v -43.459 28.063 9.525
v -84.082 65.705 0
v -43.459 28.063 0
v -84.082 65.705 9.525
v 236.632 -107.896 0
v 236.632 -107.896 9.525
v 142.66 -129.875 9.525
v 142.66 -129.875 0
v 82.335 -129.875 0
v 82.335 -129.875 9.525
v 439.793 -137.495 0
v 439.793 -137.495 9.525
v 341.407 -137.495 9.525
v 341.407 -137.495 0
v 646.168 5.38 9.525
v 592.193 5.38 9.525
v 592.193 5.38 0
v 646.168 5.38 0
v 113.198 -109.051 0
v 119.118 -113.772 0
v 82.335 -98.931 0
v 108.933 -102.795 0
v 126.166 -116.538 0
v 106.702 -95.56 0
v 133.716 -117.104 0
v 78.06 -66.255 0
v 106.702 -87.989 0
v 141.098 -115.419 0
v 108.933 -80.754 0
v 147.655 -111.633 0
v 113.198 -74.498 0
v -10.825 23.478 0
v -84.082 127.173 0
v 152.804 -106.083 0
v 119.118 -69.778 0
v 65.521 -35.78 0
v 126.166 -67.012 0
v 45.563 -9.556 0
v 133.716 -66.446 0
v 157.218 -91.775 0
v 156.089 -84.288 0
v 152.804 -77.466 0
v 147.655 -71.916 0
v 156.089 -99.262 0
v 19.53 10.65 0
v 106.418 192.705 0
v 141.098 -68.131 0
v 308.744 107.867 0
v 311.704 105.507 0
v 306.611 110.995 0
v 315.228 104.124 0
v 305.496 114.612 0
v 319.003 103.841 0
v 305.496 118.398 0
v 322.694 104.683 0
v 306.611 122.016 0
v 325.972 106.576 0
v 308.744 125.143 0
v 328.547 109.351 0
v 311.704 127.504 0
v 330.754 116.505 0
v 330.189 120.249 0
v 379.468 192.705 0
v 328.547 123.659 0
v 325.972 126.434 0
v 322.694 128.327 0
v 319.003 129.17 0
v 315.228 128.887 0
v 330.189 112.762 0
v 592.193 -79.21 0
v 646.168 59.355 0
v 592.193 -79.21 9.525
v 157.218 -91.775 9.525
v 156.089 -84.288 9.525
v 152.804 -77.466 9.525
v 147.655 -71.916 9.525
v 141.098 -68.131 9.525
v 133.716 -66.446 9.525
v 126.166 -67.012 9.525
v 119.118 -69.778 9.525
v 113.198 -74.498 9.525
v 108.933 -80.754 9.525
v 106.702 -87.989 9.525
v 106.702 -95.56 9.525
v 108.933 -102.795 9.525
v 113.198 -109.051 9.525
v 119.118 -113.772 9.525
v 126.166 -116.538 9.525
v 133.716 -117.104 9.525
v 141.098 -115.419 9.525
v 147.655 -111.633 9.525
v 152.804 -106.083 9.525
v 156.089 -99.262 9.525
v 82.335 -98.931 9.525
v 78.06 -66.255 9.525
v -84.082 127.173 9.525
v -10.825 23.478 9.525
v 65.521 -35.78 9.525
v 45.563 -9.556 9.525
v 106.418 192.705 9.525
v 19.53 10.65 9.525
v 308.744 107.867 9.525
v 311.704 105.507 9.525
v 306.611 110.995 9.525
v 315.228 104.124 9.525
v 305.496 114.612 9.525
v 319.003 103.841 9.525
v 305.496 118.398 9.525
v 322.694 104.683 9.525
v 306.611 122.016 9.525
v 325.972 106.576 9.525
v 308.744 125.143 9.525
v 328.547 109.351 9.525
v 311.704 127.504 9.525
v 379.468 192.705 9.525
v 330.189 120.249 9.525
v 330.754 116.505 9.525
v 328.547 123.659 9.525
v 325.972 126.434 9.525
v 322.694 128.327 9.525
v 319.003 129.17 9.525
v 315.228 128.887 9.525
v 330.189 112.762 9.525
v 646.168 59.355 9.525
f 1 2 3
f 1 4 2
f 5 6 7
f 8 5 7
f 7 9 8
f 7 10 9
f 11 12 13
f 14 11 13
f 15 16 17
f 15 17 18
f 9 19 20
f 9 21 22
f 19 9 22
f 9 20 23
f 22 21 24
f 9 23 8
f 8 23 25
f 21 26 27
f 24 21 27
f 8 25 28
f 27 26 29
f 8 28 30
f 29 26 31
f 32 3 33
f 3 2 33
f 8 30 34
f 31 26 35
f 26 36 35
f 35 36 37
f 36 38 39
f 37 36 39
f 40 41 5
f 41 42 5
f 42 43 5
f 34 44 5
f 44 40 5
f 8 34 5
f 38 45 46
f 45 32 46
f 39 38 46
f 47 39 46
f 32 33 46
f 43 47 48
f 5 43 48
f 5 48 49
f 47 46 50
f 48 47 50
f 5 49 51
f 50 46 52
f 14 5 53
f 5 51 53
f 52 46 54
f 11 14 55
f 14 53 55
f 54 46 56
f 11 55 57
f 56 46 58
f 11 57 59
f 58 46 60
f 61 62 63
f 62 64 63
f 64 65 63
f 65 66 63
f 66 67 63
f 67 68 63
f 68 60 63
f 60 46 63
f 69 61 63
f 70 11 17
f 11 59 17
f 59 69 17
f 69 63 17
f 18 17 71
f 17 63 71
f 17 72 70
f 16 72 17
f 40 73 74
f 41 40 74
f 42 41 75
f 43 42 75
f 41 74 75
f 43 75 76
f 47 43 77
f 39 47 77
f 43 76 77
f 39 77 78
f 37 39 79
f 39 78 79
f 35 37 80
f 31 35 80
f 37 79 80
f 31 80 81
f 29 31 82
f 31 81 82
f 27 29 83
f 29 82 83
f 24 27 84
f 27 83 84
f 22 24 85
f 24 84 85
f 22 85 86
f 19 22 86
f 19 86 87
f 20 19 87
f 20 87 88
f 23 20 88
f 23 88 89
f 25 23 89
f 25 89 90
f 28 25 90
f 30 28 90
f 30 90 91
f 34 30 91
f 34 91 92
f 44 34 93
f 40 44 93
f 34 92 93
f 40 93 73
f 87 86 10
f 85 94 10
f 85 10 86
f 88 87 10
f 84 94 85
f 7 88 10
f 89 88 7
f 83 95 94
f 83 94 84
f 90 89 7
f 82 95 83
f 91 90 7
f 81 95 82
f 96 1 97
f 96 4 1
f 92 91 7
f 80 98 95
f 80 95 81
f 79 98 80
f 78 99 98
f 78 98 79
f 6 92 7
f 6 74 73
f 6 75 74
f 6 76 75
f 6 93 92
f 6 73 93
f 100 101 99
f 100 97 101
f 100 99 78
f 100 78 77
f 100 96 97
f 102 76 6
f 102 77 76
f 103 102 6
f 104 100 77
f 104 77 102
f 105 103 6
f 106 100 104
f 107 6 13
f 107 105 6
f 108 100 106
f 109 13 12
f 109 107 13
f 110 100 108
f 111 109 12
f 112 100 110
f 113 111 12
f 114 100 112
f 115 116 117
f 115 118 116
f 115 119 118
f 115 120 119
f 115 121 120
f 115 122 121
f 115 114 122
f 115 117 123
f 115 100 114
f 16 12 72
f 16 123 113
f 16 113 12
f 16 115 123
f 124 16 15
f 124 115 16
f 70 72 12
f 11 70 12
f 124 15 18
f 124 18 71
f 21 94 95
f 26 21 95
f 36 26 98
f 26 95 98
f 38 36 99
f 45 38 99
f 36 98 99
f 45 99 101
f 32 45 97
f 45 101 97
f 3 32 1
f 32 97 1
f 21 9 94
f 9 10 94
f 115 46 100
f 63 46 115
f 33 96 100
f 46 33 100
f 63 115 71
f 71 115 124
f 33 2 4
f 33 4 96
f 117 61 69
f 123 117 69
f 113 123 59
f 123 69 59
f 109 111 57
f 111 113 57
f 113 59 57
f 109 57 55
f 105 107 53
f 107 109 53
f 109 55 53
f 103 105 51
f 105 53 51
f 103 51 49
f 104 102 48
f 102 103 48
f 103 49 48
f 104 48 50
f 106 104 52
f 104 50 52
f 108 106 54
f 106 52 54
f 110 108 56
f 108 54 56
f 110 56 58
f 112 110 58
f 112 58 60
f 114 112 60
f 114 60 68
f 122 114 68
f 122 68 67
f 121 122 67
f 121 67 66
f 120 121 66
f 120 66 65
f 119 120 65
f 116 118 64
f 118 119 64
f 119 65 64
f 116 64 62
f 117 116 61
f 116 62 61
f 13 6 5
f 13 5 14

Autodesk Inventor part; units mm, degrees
ref_plane "YZ Plane" through (0, 0, 0) normal (1, 0, 0) x (0, 1, 0)
ref_plane "XZ Plane" through (0, 0, 0) normal (0, 1, 0) x (-1, 0, 0)
ref_plane "XY Plane" through (0, 0, 0) normal (0, 0, 1) x (1, 0, 0)
sketch "Sketch1" plane through (0, 0, 0) normal (0, 0, 1) x (1, 0, 0)
  line L0 (-84.0821, 192.7052) -> (642.9929, 192.7052)
  line L1 (642.9929, 192.7052) -> (642.9929, -137.4948)
  line L2 (642.9929, -137.4948) -> (-84.0821, -137.4948)
  line L3 (-84.0821, -137.4948) -> (-84.0821, 192.7052)
  circle A0 centre (131.8179, -91.7748) radius 25.4
  circle A1 centre (318.0537, 116.5052) radius 12.7
  line L4 (642.9929, -137.4948) -> (592.1929, -137.4948)
  line L5 (592.1929, -137.4948) -> (592.1929, -73.9948)
  line L6 (592.1929, -73.9948) -> (642.9929, -73.9948)
  line L7 (642.9929, -73.9948) -> (642.9929, -137.4948)
  line L8 (642.9929, 192.7052) -> (592.6352, 192.7052)
  line L9 (642.9929, 2.2052) -> (642.9929, 192.7052)
  line L10 (-84.0821, 53.0052) -> (5.7204, 53.0052) construction
  line L11 (-84.0821, 65.7052) -> (68.3179, -137.4948)
  line L12 (595.3679, 192.7052) -> (595.3679, 2.2052)
  line L13 (595.3679, 2.2052) -> (642.9929, 2.2052)
  point P0 (0, 0)
  dimension "d0" = 727.075
  dimension "d2" = 50.8
  dimension "d3" = 25.4
  dimension "d4" = 215.9
  dimension "d5" = 279.4
  dimension "d14" = 152.4
  dimension "d15" = 203.2
  dimension "d16" = 330.2
  dimension "d17" = 63.5
  dimension "d19" = 50.8
  dimension "d20" = 139.7
  dimension "d21" = 45.72
  dimension "d22" = 254
extrude "Extrusion1" add sketch "Sketch1" along normal blind 9.525 contours L0 L12 L13 L1 L6 L5 L2 L11 L3
sketch "Sketch3" plane through (0, 0, 9.525) normal (0, 0, 1) x (1, 0, 0)
  line L0 (595.3679, 2.2052) -> (595.3679, 192.7052) projected
  line L1 (595.3679, 192.7052) -> (-84.0821, 192.7052) projected
  line L2 (-84.0821, 192.7052) -> (-84.0821, 65.7052) projected
  line L3 (-84.0821, 127.1732) -> (106.4179, 192.7052)
  line L4 (595.3679, 2.2052) -> (684.2679, 2.2052)
  line L5 (684.2679, 2.2052) -> (684.2679, 40.3052)
  line L6 (684.2679, 40.3052) -> (595.3679, 40.3052)
  line L7 (595.3679, 40.3052) -> (595.3679, 2.2052)
  line L8 (684.2679, 40.3052) -> (379.4679, 192.7052)
  line L9 (595.3679, 40.3052) -> (595.3679, 84.7552)
  line L10 (595.3679, 84.7552) -> (595.3679, 192.7052)
  point P0 (0, 0)
  dimension "d32" = 190.5
  dimension "d33" = 65.532
  dimension "d38" = 88.9
  dimension "d39" = 38.1
  dimension "d40" = 215.9
extrude "Extrusion4" cut sketch "Sketch3" against normal blind 9.525 contours L3 L2 L1 | L8 L1 L0 | L0 L8 L6
sketch "Sketch4" plane through (0, 0, 9.525) normal (0, 0, 1) x (1, 0, 0)
  line L0 (595.3679, 2.2052) -> (595.3679, 84.7552) projected
  line L1 (595.3679, 84.7552) -> (379.4679, 192.7052) projected
  line L2 (595.3679, 84.7552) -> (684.2679, 40.3052)
  line L3 (684.2679, 40.3052) -> (595.3679, 40.3052)
  point P0 (0, 0)
  dimension "d43" = 88.9
extrude "Extrusion5" add sketch "Sketch4" against normal blind 9.525
sketch "Sketch5" plane through (0, 0, 9.525) normal (0, 0, 1) x (1, 0, 0)
  line L0 (642.9929, 2.2052) -> (592.1929, 2.2052)
  line L1 (592.1929, 2.2052) -> (592.1929, -73.9948)
  line L2 (592.1929, -73.9948) -> (642.9929, -73.9948)
  line L3 (642.9929, -73.9948) -> (642.9929, 2.2052)
  point P0 (0, 0)
extrude "Extrusion6" cut sketch "Sketch5" against normal blind 9.525
sketch "Sketch6" plane through (0, 0, 9.525) normal (0, 0, 1) x (1, 0, 0)
  line L0 (592.1929, -137.4948) -> (592.1929, 2.2052) projected
  line L1 (646.1679, 91.1052) -> (723.1394, 91.1052)
  line L2 (723.1394, 91.1052) -> (723.1394, -6.7385)
  line L3 (723.1394, -6.7385) -> (646.1679, -6.7385)
  line L4 (646.1679, -6.7385) -> (646.1679, 91.1052)
  line L5 (595.3679, 2.2052) -> (592.1929, 2.2052)
  line L6 (592.1929, 2.2052) -> (592.1929, 40.3052)
  line L7 (592.1929, 40.3052) -> (595.3679, 40.3052)
  line L8 (595.3679, 40.3052) -> (595.3679, 2.2052)
  point P0 (0, 0)
  dimension "d48" = 53.975
extrude "Extrusion7" cut sketch "Sketch6" against normal blind 9.525
sketch "Sketch8" plane through (0, 0, 9.525) normal (0, 0, 1) x (1, 0, 0)
  line L0 (-84.0821, 65.7052) -> (68.3179, -137.4948) projected
  line L1 (68.3179, -137.4948) -> (592.1929, -137.4948) projected
  line L2 (592.1929, -137.4948) -> (592.1929, 40.3052) projected
  line L3 (592.1929, -96.6594) -> (439.7929, -137.4948)
  line L4 (341.7489, -137.4948) -> (170.3104, -117.1748)
  line L5 (170.3104, -117.1748) -> (53.0779, -117.1748)
  point P0 (0, 0)
  dimension "d51" = 152.4
  dimension "d52" = 165
  dimension "d53" = 98.044
  dimension "d54" = 20.32
  dimension "d60" = 173.24
extrude "Extrusion8" cut sketch "Sketch8" against normal blind 9.525
sketch "Sketch9" plane through (0, 0, 9.525) normal (0, 0, 1) x (1, 0, 0)
  line L0 (592.1929, -96.6594) -> (592.1929, 40.3052) projected
  line L1 (646.1679, 40.3052) -> (592.1929, 40.3052)
  line L2 (592.1929, 40.3052) -> (592.1929, 5.3802)
  line L3 (592.1929, 5.3802) -> (646.1679, 5.3802)
  line L4 (646.1679, 5.3802) -> (646.1679, 40.3052)
  point P0 (0, 0)
  dimension "d57" = 34.925
extrude "Extrusion9" add sketch "Sketch9" against normal blind 9.525
sketch "Sketch10" plane through (0, 0, 9.525) normal (0, 0, 1) x (1, 0, 0)
  line L0 (-84.0821, 65.7052) -> (53.0779, -117.1748) projected
  line L1 (-84.0821, 127.1732) -> (-84.0821, 65.7052) projected
  line L2 (53.0779, -117.1748) -> (170.3104, -117.1748) projected
  arc A0 (82.3351, -98.9312) -> (-55.5071, 27.6052) centre (-44.6649, -98.9312) ccw
  line L3 (341.7489, -137.4948) -> (439.7929, -137.4948) projected
  line L4 (82.3351, -117.1748) -> (82.3351, -75.9981)
  point P0 (0, 0)
  point P1 (81.0179, -117.1748)
  point P2 (131.8179, -117.1748)
  dimension "d62" = 38.1
  dimension "d65" = 127
  dimension "d66" = 165.1
extrude "Extrusion10" cut sketch "Sketch10" against normal blind 25.4
sketch "Sketch12" plane through (0, 0, 9.525) normal (0, 0, 1) x (1, 0, 0)
  circle A0 centre (131.8179, -91.7748) radius 25.4 projected
  circle A1 centre (131.8179, -91.7748) radius 38.1
  point P0 (0, 0)
  dimension "d70" = 76.2
extrude "Extrusion12" cut sketch "Sketch12" against normal blind 9.525
sketch "Sketch14" plane through (0, 0, 9.525) normal (0, 0, 1) x (1, 0, 0)
  arc A0 (160.2159, -117.1748) -> (103.4198, -117.1748) centre (131.8179, -91.7748) ccw projected
  line L0 (160.2159, -117.1748) -> (170.3104, -117.1748) projected
  line L1 (170.3104, -117.1748) -> (341.7489, -137.4948) projected
  line L2 (82.3351, -117.1748) -> (103.4198, -117.1748) projected
  circle A1 centre (131.8179, -91.7748) radius 38.1
  line L3 (341.7489, -137.4948) -> (82.3351, -137.4948)
  line L4 (82.3351, -137.4948) -> (82.3351, -117.1748)
  point P0 (0, 0)
  dimension "d74" = 20.32
extrude "Extrusion13" add sketch "Sketch14" against normal blind 9.525 contours L0 L1 L3 L4 L2 A1
sketch "Sketch15" plane through (0, 0, 9.525) normal (0, 0, 1) x (1, 0, 0)
  circle A0 centre (131.8179, -91.7748) radius 38.1 projected
  line L0 (82.3351, -98.9312) -> (82.3351, -137.4948) projected
  line L1 (82.3351, -137.4948) -> (439.7929, -137.4948) projected
  circle A1 centre (185.7929, -51.1348) radius 76.2
  circle A2 centre (373.8763, -101.9348) radius 76.2
  line L2 (82.3351, -110.8248) -> (177.5851, -110.8248)
  line L3 (177.5851, -110.8248) -> (177.5851, -72.7248)
  line L4 (177.5851, -72.7248) -> (82.3351, -72.7248)
  line L5 (82.3351, -72.7248) -> (82.3351, -110.8248)
  line L6 (236.6324, -107.8955) -> (341.4074, -137.4948)
  line L7 (-84.0821, 127.1732) -> (-84.0821, 65.7052) projected
  line L8 (131.8179, -129.8748) -> (175.334, -129.8748)
  line L9 (131.8179, -129.8748) -> (82.3351, -129.8748)
  line L10 (236.6324, -107.8955) -> (142.6601, -129.8748)
  point P0 (0, 0)
  point P1 (154.0824, -137.4948)
  dimension "d77" = 152.4
  dimension "d78" = 53.975
  dimension "d79" = 40.64
  dimension "d80" = 152.4
  dimension "d81" = 291.5412
  dimension "d82" = 35.56
  dimension "d84" = 95.25
  dimension "d85" = 38.1
  dimension "d86" = 26.67
  dimension "d87" = 82.55
  dimension "d90" = 104.775
  dimension "d101" = 60.325
sketch "Sketch17" plane through (0, 0, 9.525) normal (0, 0, 1) x (1, 0, 0)
  line L0 (439.7929, -137.4948) -> (592.1929, -96.6594) projected
  line L1 (592.1929, -96.6594) -> (592.1929, 5.3802) projected
  line L2 (592.1929, -79.2096) -> (439.7929, -137.4948)
  point P0 (0, 0)
  dimension "d94" = 17.4498
extrude "Extrusion16" cut sketch "Sketch17" against normal blind 9.525
extrude "Extrusion18" cut sketch "Sketch15" against normal blind 9.525 contours L8 L10 A1 L6 A2 L1 L0 L9 | L10 A1 | L6 L1 A2 picked at (315.3812, -131.2856)
sketch "Sketch20" plane through (0, 0, 9.525) normal (0, 0, 1) x (1, 0, 0)
  circle A0 centre (131.8179, -91.7748) radius 38.1 projected
  circle A1 centre (131.8179, -91.7748) radius 25.4
  point P0 (0, 0)
  dimension "d102" = 50.8
extrude "Extrusion19" add sketch "Sketch20" against normal blind 9.525
sketch "Sketch21" plane through (0, 0, 9.525) normal (0, 0, 1) x (1, 0, 0)
  line L0 (-84.0821, 65.7052) -> (-55.5071, 27.6052) projected
  arc A0 (82.3351, -98.9312) -> (-55.5071, 27.6052) centre (-44.6649, -98.9312) ccw projected
  line L1 (-84.0821, 65.7052) -> (-43.4592, 28.0631)
  point P0 (0, 0)
extrude "Extrusion20" cut sketch "Sketch21" against normal blind 9.525
properties part number "ShooterMountLeft_NERDS"
